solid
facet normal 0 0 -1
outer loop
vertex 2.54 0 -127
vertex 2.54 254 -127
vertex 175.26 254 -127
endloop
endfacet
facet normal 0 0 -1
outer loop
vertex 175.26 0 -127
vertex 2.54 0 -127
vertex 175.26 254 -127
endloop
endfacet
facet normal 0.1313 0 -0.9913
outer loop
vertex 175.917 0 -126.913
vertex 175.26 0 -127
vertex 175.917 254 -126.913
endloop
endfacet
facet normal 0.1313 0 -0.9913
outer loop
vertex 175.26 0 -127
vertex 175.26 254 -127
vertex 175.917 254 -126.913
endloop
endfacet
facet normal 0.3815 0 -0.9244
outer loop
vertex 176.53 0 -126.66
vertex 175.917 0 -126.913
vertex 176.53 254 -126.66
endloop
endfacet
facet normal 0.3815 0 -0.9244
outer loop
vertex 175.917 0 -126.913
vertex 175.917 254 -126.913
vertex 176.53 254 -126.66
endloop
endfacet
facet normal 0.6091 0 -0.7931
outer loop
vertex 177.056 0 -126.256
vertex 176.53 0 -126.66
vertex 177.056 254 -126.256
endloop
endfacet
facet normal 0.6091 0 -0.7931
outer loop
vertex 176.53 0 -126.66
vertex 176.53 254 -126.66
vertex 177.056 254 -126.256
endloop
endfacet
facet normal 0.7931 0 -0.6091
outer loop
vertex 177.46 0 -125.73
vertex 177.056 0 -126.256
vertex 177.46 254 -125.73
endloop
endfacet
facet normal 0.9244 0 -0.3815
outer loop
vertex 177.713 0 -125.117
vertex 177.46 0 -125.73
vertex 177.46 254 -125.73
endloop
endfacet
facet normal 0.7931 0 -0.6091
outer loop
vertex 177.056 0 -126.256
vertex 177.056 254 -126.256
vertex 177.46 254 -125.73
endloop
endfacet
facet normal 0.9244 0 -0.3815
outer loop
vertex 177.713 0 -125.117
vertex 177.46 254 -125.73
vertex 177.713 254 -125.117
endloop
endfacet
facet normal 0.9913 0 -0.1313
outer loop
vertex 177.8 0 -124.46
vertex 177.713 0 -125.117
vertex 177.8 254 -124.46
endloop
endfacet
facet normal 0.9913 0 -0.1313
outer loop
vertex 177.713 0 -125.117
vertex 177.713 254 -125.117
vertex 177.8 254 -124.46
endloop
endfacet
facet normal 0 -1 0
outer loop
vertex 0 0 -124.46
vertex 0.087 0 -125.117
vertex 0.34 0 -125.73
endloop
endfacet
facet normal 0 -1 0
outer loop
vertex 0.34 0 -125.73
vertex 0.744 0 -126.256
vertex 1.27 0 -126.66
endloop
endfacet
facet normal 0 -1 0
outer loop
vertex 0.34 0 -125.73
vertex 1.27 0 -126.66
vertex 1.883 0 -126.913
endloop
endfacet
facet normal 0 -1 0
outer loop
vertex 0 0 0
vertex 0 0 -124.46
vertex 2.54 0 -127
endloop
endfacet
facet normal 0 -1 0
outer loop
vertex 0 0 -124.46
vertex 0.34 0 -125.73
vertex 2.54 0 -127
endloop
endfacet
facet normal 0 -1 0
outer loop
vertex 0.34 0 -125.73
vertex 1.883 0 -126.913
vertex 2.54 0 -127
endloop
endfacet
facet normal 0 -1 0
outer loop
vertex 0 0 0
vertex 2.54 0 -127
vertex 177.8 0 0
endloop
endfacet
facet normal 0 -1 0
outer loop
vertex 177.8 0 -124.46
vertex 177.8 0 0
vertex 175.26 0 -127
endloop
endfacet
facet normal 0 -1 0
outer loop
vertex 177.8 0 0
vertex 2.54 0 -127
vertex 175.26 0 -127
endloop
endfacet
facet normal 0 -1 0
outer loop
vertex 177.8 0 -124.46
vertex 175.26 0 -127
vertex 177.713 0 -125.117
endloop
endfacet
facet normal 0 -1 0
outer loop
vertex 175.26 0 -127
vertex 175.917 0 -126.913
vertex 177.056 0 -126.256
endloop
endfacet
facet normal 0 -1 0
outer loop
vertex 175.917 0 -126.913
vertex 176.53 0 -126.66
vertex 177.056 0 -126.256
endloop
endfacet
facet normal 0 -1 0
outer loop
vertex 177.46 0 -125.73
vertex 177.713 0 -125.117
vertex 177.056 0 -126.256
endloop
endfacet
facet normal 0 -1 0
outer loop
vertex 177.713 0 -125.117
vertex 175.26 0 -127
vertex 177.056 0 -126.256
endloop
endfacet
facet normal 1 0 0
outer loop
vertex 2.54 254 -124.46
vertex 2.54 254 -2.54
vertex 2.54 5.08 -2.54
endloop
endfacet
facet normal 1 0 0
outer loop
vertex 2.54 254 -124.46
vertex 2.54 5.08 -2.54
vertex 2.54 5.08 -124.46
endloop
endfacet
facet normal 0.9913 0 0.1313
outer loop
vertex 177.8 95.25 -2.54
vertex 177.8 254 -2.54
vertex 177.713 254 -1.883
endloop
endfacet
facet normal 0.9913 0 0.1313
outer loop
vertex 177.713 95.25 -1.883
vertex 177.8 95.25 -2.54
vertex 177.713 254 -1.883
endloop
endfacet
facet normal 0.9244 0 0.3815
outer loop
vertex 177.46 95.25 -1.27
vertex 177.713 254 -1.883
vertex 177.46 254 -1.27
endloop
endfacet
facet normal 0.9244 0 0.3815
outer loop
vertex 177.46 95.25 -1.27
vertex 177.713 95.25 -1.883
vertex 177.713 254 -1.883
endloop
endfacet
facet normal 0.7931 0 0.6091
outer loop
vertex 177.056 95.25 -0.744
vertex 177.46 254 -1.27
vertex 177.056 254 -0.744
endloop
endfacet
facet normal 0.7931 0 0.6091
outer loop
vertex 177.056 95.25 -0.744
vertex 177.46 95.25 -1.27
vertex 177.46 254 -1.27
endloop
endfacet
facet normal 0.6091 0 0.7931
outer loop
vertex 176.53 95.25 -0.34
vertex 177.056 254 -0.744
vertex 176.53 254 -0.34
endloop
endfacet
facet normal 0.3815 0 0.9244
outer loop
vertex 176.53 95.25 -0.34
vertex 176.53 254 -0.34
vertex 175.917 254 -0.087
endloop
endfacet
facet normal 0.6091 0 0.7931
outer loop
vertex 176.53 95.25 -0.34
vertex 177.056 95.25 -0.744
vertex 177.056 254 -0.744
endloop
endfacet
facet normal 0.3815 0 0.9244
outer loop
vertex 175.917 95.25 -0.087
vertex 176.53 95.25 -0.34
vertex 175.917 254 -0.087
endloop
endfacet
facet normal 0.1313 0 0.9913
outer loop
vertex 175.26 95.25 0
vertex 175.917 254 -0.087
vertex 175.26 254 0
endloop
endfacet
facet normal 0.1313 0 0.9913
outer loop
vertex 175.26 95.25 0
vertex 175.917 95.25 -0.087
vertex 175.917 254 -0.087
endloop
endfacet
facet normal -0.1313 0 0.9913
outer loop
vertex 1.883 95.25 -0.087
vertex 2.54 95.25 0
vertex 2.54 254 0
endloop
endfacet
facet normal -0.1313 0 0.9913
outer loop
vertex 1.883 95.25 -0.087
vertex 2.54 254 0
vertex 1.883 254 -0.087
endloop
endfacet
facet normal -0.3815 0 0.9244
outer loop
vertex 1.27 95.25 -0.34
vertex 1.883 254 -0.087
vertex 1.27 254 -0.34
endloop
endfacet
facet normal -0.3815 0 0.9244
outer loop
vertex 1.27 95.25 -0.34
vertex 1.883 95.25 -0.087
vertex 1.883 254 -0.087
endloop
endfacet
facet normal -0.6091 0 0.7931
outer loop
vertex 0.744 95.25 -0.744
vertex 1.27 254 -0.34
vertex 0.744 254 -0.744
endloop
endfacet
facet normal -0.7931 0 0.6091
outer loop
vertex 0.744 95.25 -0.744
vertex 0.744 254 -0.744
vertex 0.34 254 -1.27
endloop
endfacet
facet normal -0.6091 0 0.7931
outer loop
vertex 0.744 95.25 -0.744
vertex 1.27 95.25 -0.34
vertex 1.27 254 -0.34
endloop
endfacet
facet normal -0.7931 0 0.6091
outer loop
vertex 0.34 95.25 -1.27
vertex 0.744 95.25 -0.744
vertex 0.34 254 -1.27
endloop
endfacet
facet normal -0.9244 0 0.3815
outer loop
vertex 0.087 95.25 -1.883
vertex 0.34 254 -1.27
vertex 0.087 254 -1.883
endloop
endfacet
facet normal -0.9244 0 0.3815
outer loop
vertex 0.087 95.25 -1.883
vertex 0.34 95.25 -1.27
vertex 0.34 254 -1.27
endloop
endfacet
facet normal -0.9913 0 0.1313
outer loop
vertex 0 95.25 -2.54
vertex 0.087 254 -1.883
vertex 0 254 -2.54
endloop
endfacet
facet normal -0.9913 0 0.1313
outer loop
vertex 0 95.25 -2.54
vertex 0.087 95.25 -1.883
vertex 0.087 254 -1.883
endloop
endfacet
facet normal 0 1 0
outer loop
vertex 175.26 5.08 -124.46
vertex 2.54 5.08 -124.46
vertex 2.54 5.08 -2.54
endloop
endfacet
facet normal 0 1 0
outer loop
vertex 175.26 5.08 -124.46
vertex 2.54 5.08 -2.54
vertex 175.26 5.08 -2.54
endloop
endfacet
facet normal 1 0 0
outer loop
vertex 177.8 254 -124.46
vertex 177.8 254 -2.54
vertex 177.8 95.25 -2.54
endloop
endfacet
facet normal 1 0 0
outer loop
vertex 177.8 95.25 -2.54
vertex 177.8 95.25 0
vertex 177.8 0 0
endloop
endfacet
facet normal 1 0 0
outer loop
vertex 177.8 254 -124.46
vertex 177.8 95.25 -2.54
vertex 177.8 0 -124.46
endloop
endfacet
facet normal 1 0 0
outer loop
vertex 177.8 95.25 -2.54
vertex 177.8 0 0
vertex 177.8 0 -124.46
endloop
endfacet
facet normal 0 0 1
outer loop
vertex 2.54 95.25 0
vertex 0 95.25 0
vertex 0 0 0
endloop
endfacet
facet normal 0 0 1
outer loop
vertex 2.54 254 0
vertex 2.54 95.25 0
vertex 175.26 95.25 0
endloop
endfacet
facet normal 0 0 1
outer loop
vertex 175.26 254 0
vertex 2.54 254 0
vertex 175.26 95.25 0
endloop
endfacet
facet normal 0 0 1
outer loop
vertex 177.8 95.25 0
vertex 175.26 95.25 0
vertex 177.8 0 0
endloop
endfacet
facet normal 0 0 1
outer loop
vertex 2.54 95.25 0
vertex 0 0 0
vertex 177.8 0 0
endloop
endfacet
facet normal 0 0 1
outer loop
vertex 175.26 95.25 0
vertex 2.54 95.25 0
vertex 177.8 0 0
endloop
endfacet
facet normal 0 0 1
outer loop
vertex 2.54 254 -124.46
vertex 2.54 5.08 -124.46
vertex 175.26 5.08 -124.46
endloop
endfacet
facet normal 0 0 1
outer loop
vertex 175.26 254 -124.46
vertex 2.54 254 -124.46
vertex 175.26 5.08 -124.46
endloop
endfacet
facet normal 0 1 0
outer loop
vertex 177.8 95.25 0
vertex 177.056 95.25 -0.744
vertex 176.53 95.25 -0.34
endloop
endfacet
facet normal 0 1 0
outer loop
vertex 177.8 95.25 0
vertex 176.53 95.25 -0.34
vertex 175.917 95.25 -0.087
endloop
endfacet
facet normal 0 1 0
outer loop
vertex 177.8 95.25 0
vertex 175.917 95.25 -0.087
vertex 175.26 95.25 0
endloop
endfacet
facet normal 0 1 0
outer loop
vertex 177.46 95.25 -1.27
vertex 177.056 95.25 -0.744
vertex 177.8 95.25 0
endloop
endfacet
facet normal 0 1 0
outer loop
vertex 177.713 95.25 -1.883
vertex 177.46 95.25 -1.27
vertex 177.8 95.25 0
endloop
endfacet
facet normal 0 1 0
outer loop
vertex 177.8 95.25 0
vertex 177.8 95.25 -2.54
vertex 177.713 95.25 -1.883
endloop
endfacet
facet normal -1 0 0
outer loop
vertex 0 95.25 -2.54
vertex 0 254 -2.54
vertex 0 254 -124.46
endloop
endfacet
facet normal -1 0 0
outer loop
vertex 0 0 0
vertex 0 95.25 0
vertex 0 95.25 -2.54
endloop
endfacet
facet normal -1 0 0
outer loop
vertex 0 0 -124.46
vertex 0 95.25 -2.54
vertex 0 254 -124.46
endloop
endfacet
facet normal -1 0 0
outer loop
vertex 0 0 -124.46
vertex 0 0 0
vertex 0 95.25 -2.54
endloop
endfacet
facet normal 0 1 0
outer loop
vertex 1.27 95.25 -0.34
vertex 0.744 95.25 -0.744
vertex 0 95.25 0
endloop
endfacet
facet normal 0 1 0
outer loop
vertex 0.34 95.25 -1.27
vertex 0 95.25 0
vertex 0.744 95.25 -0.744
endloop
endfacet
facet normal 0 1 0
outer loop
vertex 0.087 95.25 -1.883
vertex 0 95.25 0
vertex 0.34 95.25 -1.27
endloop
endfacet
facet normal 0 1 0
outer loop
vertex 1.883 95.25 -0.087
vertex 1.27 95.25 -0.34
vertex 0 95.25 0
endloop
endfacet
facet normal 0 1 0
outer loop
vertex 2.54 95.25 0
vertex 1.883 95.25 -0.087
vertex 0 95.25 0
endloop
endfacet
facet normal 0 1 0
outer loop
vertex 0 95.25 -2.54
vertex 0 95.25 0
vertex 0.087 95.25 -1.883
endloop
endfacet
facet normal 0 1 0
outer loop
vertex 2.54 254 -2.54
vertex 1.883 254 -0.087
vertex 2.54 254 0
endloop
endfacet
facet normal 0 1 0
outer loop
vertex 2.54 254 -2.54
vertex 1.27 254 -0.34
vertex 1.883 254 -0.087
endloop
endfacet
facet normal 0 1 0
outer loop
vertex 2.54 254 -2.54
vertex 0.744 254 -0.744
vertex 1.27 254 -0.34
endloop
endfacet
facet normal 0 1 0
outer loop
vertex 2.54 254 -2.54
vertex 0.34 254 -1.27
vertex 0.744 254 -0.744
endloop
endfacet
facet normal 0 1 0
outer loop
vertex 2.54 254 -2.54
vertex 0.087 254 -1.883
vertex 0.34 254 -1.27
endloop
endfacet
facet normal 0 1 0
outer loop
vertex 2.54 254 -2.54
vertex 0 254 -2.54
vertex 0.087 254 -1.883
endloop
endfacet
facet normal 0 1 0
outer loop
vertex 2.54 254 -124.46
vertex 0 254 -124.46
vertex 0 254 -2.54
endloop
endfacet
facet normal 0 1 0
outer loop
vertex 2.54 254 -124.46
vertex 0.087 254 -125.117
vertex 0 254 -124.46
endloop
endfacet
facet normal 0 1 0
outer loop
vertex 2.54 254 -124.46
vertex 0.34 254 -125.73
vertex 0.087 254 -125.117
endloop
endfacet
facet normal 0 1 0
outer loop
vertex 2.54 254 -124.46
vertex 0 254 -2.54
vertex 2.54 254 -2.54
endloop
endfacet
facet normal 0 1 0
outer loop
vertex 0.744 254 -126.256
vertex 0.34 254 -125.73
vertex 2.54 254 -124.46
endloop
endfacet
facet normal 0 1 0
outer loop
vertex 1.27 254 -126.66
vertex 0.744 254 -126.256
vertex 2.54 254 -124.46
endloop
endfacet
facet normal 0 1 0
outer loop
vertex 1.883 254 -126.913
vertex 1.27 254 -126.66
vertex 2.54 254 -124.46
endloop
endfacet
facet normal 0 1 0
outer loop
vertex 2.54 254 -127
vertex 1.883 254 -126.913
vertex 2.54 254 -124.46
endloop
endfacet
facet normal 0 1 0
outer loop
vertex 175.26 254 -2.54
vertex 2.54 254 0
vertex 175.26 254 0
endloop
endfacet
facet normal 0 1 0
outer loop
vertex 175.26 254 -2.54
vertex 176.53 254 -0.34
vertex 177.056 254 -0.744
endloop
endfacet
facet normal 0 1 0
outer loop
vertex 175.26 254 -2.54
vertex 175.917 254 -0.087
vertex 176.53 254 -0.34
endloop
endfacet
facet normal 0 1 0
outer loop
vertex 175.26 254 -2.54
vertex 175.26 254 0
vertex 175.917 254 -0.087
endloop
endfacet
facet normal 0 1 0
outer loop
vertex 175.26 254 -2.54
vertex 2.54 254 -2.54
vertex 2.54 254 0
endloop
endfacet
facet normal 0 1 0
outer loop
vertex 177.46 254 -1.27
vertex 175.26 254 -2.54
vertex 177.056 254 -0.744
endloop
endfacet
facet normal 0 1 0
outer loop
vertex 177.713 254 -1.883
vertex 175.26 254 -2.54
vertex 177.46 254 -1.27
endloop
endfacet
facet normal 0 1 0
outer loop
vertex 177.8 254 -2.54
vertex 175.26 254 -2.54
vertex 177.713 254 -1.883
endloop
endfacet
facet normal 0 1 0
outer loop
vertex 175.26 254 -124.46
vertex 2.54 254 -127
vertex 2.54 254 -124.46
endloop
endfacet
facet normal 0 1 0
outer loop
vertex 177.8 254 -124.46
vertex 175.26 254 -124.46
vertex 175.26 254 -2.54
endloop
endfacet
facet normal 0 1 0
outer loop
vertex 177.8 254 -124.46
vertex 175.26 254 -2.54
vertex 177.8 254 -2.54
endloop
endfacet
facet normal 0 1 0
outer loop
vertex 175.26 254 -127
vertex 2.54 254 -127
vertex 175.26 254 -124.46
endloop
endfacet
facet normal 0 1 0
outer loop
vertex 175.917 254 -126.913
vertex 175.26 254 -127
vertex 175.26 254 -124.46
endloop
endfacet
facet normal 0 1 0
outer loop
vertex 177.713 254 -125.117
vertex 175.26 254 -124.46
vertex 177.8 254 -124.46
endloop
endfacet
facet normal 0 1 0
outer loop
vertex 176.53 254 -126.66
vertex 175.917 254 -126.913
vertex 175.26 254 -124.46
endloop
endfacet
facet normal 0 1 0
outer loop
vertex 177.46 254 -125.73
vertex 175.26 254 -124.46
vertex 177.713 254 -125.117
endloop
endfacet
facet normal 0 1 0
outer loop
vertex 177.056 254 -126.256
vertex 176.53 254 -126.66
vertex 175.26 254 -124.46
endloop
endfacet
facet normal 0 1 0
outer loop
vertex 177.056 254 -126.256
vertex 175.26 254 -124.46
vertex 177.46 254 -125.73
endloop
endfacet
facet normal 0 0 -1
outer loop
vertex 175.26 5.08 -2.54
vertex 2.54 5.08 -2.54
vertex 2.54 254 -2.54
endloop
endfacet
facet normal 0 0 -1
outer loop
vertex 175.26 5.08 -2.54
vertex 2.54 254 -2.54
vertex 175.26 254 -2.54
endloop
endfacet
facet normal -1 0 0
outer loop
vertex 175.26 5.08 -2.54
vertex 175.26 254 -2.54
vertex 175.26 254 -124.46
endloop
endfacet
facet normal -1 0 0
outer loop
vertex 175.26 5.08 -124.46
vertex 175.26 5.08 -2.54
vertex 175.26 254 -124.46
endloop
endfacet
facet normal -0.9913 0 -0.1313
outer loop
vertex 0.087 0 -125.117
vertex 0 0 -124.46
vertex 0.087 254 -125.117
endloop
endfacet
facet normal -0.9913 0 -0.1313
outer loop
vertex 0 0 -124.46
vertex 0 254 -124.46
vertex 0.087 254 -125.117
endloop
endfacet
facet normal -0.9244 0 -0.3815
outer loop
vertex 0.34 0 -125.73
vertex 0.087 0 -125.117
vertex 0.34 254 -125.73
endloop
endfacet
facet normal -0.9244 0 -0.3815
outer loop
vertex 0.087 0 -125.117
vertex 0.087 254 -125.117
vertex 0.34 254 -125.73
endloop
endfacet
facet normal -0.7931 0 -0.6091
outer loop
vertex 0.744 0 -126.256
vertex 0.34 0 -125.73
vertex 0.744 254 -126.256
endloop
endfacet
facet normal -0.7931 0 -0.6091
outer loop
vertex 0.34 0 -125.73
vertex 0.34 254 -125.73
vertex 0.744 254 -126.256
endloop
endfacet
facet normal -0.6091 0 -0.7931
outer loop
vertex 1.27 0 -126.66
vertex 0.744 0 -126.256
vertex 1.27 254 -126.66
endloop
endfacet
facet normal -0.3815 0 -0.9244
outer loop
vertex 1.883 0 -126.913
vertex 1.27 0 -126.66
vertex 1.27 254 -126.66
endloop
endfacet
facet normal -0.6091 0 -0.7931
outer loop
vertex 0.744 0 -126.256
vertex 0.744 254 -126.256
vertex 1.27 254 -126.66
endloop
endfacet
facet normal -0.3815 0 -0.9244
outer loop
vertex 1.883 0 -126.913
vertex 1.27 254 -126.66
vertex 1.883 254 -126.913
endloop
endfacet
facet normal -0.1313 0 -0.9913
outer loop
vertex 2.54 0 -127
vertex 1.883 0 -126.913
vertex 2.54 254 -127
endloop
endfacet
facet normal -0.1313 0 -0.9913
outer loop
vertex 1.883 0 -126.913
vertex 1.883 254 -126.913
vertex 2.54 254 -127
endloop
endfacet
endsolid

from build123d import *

# Parameters (mm, degrees)
SKETCH1_W           = 177.8
SKETCH1_H           = 127
BOSS_EXTRUDE1_DEPTH = 254
SKETCH2_W           = 172.72
SKETCH2_H           = 121.92
CUT_EXTRUDE1_DEPTH  = 248.92
FILLET2_R           = 2.54
FILLET3_START       = 95.25
FILLET3_DEPTH       = 159.75


with BuildPart() as part:
    # Sketch1 → Boss-Extrude1 (new body)
    with BuildSketch(Plane(origin=(0, 0, 0), x_dir=(1, 0, 0), z_dir=(0, 1, 0))):
        with Locations((88.9, 63.5)):
            Rectangle(SKETCH1_W, SKETCH1_H)
    extrude(amount=BOSS_EXTRUDE1_DEPTH)

    # Sketch2 → Cut-Extrude1 (cut)
    with BuildSketch(Plane(origin=(0, 254, 0), x_dir=(1, 0, 0), z_dir=(0, 1, 0))):
        with Locations((88.9, 63.5)):
            Rectangle(SKETCH2_W, SKETCH2_H)
    extrude(amount=-CUT_EXTRUDE1_DEPTH, mode=Mode.SUBTRACT)

    # Fillet2
    fillet2_edges = [part.edges().sort_by_distance(p)[0] for p in [
        (0, 127, -127),
        (177.8, 127, -127),
    ]]
    fillet(fillet2_edges, radius=FILLET2_R)

    # Fillet3: read off the stored shape, not the designer's step
    # Fillet3 outline → Fillet3 (cut)
    with BuildSketch(Plane(origin=(0, 0, 0), x_dir=(1, 0, 0), z_dir=(0, 1, 0)).offset(FILLET3_START)):
        with BuildLine():
            Line((0, 0), (2.54, 0))
            ThreePointArc((2.54, 0), (0.743948776, 0.743948776), (0, 2.54))
            Line((0, 2.54), (0, 0))
        make_face()
        with BuildLine():
            ThreePointArc((177.8, 2.54), (177.056051224, 0.743948776), (175.26, 0))
            Line((175.26, 0), (177.8, 0))
            Line((177.8, 0), (177.8, 2.54))
        make_face()
    extrude(amount=FILLET3_DEPTH, mode=Mode.SUBTRACT)


solid = part.part
